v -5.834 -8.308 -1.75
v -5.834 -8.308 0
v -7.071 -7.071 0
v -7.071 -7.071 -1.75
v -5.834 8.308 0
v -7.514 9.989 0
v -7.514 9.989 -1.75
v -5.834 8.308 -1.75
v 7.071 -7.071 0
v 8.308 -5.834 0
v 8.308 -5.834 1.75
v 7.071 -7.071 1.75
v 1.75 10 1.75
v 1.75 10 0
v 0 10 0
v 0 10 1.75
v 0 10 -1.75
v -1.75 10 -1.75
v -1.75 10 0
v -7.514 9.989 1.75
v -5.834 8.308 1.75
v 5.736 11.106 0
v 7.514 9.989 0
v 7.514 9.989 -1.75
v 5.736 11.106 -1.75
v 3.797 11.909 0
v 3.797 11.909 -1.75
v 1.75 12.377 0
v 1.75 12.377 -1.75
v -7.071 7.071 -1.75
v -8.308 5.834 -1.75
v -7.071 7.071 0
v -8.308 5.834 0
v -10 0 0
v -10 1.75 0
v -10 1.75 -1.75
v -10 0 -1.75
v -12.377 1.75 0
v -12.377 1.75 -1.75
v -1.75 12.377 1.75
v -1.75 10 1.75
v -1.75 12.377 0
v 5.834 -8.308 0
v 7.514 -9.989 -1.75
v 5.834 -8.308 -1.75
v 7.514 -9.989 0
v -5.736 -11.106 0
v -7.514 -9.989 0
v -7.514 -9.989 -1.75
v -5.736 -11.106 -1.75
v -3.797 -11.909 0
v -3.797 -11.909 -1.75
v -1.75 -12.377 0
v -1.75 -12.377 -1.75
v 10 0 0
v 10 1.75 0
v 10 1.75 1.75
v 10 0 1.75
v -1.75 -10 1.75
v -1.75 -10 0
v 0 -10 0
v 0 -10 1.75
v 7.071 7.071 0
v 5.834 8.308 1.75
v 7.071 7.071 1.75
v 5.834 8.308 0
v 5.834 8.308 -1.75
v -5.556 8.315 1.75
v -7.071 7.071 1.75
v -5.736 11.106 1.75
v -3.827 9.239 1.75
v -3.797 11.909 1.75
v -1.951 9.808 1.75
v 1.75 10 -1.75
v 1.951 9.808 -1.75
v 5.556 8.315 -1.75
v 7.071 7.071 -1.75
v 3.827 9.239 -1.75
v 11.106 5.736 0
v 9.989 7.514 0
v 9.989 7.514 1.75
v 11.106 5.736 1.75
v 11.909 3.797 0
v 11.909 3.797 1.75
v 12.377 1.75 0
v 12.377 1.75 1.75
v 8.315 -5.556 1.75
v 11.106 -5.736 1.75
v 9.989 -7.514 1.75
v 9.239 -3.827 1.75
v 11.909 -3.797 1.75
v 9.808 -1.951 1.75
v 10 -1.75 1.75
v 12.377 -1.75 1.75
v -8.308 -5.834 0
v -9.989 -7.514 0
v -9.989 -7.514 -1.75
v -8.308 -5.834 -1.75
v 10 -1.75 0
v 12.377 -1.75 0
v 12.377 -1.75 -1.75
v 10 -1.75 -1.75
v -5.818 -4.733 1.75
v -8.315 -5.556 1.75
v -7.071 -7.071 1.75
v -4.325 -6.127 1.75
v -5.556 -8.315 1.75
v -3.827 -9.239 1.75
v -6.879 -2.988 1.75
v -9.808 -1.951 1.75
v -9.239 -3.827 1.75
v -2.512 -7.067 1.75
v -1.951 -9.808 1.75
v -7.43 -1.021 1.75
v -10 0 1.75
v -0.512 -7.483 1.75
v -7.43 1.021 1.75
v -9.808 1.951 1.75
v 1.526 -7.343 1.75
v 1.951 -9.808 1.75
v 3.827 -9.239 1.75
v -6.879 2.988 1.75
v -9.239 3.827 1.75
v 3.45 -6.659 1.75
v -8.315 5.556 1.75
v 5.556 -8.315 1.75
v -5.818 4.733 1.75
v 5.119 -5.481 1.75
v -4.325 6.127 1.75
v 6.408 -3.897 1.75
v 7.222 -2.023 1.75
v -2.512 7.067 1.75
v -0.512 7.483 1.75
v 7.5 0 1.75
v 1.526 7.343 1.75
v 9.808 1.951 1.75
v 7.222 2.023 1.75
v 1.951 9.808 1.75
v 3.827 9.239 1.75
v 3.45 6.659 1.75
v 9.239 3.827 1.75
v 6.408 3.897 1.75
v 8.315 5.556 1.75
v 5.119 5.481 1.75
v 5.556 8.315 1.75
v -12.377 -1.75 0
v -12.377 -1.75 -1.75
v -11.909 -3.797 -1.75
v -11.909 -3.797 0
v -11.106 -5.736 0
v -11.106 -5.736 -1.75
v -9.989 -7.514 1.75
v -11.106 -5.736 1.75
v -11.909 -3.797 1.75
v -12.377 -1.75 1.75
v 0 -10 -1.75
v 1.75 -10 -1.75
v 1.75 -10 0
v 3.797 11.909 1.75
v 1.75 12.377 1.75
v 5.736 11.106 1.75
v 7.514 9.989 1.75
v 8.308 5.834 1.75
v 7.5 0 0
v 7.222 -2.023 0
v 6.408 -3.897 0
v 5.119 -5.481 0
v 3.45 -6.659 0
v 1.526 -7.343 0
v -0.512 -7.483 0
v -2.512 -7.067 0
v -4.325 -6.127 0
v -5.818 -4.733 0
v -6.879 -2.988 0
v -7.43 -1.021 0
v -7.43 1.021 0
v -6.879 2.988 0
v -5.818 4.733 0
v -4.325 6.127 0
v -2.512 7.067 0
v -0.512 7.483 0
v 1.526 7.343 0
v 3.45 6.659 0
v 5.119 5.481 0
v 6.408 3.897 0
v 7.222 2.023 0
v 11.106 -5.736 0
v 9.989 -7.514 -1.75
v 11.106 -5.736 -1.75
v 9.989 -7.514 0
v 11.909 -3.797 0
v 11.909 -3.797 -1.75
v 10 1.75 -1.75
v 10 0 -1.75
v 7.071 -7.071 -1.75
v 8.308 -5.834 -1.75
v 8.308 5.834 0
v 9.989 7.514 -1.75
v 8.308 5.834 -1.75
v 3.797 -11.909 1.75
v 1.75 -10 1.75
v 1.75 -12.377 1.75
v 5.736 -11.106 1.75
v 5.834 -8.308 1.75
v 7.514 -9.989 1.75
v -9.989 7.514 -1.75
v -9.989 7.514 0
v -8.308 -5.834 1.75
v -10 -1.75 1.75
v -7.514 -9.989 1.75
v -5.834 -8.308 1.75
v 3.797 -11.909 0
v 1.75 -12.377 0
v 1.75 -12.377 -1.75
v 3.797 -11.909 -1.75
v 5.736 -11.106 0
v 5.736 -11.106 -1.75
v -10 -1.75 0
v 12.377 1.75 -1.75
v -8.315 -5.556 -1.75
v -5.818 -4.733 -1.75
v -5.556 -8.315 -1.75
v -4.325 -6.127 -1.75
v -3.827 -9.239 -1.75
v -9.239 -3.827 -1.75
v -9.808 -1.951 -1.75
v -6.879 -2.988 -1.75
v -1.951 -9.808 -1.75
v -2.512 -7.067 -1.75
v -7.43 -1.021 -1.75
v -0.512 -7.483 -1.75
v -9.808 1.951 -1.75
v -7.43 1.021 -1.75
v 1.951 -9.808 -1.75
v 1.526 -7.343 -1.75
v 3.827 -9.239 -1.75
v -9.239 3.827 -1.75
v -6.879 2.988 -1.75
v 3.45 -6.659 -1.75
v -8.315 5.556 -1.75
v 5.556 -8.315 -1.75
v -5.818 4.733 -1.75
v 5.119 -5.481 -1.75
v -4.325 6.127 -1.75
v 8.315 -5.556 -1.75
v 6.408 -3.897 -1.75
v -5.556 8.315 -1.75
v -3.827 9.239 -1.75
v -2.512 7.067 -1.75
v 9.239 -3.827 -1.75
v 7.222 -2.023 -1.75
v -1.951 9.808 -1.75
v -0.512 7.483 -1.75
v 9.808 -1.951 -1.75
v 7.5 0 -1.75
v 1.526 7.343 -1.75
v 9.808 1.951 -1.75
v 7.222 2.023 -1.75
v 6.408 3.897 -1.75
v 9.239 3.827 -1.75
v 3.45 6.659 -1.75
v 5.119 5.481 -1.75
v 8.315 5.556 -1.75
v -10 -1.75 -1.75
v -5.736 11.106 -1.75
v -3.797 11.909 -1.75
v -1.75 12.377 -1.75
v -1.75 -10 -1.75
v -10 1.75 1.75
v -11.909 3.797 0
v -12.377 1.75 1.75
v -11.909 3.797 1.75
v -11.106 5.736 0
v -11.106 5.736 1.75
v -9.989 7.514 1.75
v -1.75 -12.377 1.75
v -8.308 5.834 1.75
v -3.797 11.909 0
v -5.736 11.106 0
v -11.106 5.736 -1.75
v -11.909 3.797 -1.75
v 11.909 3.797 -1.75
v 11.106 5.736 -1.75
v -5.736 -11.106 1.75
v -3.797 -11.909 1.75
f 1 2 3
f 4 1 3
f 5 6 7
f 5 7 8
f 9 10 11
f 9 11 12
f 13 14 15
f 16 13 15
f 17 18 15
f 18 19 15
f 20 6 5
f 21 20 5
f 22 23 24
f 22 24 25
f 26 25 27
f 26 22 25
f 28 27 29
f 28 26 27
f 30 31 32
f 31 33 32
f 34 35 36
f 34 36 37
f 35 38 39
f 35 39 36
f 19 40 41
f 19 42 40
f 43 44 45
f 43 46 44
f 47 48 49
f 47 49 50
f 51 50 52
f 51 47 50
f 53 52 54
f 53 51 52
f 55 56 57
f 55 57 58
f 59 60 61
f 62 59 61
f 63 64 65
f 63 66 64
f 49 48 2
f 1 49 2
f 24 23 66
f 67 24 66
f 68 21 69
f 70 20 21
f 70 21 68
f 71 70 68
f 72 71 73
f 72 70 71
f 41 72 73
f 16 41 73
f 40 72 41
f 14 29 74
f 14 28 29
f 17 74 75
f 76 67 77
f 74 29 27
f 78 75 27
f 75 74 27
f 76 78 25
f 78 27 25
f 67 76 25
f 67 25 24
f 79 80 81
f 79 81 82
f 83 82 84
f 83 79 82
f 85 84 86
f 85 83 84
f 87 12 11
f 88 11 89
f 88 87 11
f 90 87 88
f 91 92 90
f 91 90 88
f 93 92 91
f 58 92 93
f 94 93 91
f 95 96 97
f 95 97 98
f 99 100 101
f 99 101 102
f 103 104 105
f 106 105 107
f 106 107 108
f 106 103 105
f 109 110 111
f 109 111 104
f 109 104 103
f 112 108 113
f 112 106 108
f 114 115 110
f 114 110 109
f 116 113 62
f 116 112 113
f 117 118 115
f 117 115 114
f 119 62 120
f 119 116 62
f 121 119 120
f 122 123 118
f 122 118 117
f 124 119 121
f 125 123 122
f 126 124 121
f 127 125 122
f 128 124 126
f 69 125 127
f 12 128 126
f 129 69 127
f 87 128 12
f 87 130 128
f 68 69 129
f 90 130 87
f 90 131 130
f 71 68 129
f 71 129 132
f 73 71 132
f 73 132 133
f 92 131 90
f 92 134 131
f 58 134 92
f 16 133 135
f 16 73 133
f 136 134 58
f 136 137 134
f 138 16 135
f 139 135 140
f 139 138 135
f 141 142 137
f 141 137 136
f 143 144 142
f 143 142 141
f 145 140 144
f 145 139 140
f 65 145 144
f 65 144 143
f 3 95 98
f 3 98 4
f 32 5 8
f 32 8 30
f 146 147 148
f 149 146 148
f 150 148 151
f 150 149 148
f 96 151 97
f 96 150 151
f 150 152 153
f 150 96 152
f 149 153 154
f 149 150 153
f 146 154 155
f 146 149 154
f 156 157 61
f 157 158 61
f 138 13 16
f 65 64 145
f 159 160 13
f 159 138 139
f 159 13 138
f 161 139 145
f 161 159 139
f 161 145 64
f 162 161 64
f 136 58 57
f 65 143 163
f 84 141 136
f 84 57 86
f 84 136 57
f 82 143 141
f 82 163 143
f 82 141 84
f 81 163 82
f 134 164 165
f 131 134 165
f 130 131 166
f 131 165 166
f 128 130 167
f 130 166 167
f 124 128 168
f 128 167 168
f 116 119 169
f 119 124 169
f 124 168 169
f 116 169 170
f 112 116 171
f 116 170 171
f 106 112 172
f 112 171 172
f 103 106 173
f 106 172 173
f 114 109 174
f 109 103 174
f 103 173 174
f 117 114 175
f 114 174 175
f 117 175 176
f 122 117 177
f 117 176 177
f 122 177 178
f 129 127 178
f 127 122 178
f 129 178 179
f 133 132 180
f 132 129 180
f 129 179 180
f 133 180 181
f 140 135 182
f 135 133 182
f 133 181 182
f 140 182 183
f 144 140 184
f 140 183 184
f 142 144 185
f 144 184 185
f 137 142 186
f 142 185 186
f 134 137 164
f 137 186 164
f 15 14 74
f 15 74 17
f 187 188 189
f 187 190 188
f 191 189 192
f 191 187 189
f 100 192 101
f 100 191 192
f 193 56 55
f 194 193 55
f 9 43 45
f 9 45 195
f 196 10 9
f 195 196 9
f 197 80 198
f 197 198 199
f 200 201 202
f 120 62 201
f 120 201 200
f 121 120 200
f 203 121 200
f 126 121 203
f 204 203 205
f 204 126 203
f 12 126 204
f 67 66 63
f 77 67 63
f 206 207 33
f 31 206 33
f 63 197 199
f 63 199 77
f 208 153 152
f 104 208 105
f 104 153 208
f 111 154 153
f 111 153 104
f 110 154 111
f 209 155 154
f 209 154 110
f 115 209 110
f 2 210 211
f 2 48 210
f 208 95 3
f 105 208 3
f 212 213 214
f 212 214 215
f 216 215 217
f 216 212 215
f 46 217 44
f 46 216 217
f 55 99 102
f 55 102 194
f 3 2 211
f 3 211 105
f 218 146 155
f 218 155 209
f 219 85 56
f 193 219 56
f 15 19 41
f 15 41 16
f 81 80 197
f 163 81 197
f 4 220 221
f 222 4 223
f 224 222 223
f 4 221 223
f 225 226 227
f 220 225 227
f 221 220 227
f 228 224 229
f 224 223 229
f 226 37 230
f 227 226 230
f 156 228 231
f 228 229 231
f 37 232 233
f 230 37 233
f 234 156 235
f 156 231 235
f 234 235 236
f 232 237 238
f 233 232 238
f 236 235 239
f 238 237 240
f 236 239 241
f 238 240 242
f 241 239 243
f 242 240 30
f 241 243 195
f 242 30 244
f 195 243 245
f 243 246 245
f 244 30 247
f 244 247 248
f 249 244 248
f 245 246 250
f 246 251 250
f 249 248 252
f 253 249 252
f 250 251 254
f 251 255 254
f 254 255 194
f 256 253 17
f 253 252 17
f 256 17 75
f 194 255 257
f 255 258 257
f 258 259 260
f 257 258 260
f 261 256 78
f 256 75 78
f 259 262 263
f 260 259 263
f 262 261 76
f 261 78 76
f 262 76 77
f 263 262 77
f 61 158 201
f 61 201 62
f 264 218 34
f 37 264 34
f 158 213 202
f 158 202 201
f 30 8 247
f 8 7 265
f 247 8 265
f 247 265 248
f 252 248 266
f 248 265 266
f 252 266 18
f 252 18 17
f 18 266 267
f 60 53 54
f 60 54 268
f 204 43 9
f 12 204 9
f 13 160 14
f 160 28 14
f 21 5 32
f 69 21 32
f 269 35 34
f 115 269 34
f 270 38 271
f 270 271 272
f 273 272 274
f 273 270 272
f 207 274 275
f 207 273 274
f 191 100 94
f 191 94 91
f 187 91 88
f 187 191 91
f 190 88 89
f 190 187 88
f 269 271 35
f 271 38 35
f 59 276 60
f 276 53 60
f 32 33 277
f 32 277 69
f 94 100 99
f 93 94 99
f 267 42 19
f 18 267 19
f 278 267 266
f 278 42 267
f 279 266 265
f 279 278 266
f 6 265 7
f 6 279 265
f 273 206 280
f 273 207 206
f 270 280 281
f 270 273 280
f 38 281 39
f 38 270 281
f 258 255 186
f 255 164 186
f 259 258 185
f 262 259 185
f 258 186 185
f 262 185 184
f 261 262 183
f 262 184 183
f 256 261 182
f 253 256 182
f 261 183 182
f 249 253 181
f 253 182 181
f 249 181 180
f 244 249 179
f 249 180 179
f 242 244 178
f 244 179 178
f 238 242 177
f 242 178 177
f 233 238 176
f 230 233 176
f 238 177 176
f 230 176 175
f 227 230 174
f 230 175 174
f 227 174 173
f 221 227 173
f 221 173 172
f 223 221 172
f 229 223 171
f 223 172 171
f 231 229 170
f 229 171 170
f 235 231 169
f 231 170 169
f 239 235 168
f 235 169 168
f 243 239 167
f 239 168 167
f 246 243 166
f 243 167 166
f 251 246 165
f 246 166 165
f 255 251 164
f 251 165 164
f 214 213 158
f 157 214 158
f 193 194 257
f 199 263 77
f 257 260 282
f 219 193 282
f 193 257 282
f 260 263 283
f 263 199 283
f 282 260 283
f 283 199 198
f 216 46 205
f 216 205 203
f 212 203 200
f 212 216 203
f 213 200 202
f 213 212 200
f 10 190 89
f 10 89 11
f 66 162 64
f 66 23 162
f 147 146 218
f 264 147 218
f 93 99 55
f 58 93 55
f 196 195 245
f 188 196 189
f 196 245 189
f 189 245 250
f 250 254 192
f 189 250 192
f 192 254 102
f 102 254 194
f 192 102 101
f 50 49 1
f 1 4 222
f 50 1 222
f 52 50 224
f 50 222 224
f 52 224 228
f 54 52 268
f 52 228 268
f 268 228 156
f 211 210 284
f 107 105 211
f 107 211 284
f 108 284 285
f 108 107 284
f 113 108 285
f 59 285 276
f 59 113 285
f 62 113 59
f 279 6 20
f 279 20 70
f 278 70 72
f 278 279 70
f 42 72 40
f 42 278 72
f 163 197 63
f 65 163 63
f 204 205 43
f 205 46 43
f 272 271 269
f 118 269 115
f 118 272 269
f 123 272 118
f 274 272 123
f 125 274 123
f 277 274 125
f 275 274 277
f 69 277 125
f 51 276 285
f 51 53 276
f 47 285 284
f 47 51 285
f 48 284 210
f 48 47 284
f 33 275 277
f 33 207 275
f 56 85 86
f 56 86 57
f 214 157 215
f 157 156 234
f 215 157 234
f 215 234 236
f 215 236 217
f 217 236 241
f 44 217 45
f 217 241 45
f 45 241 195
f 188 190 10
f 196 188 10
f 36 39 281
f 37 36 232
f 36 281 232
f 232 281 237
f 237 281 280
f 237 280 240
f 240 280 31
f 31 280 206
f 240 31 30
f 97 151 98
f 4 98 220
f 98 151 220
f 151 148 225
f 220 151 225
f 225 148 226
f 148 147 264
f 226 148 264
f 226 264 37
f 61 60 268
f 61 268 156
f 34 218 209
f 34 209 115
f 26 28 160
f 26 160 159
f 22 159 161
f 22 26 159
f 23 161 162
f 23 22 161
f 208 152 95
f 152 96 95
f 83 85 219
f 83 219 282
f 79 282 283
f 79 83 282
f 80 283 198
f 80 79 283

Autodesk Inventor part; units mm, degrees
ref_plane "YZ Plane" through (0, 0, 0) normal (1, 0, 0) x (0, 1, 0)
ref_plane "XZ Plane" through (0, 0, 0) normal (0, 1, 0) x (-1, 0, 0)
ref_plane "XY Plane" through (0, 0, 0) normal (0, 0, 1) x (1, 0, 0)
sketch "Sketch1" plane through (0, 0, 0) normal (0, 0, 1) x (1, 0, 0)
  circle A0 centre (0, 0) radius 10
  circle A1 centre (0, 0) radius 12.5
  circle A2 centre (0, 0) radius 7.5
  line L0 (10, 0) -> (12.5, 0)
  line L1 (12.5, 0) -> (12.5, 1.75)
  line L2 (12.5, 1.75) -> (10, 1.75)
  line L3 (10, 1.75) -> (10, 0)
  line L4 (12.5, 0) -> (12.5, -1.75)
  line L5 (12.5, -1.75) -> (10, -1.75)
  line L6 (10, -1.75) -> (10, 0)
  line L7 (10.0763, 7.6014) -> (8.3085, 5.8336)
  line L8 (8.3085, 5.8336) -> (7.0711, 7.0711)
  line L9 (5.8336, 8.3085) -> (7.0711, 7.0711)
  line L10 (7.6014, 10.0763) -> (5.8336, 8.3085)
  line L11 (8.8388, 8.8388) -> (7.6014, 10.0763)
  line L12 (8.8388, 8.8388) -> (10.0763, 7.6014)
  line L13 (1.75, 12.5) -> (1.75, 10)
  line L14 (1.75, 10) -> (0, 10)
  line L15 (-1.75, 10) -> (0, 10)
  line L16 (-1.75, 12.5) -> (-1.75, 10)
  line L17 (0, 12.5) -> (-1.75, 12.5)
  line L18 (0, 12.5) -> (1.75, 12.5)
  line L19 (-7.6014, 10.0763) -> (-5.8336, 8.3085)
  line L20 (-5.8336, 8.3085) -> (-7.0711, 7.0711)
  line L21 (-8.3085, 5.8336) -> (-7.0711, 7.0711)
  line L22 (-10.0763, 7.6014) -> (-8.3085, 5.8336)
  line L23 (-8.8388, 8.8388) -> (-10.0763, 7.6014)
  line L24 (-8.8388, 8.8388) -> (-7.6014, 10.0763)
  line L25 (-12.5, 1.75) -> (-10, 1.75)
  line L26 (-10, 1.75) -> (-10, 0)
  line L27 (-10, -1.75) -> (-10, 0)
  line L28 (-12.5, -1.75) -> (-10, -1.75)
  line L29 (-12.5, 0) -> (-12.5, -1.75)
  line L30 (-12.5, 0) -> (-12.5, 1.75)
  line L31 (-10.0763, -7.6014) -> (-8.3085, -5.8336)
  line L32 (-8.3085, -5.8336) -> (-7.0711, -7.0711)
  line L33 (-5.8336, -8.3085) -> (-7.0711, -7.0711)
  line L34 (-7.6014, -10.0763) -> (-5.8336, -8.3085)
  line L35 (-8.8388, -8.8388) -> (-7.6014, -10.0763)
  line L36 (-8.8388, -8.8388) -> (-10.0763, -7.6014)
  line L37 (-1.75, -12.5) -> (-1.75, -10)
  line L38 (-1.75, -10) -> (0, -10)
  line L39 (1.75, -10) -> (0, -10)
  line L40 (1.75, -12.5) -> (1.75, -10)
  line L41 (0, -12.5) -> (1.75, -12.5)
  line L42 (0, -12.5) -> (-1.75, -12.5)
  line L43 (7.6014, -10.0763) -> (5.8336, -8.3085)
  line L44 (5.8336, -8.3085) -> (7.0711, -7.0711)
  line L45 (8.3085, -5.8336) -> (7.0711, -7.0711)
  line L46 (10.0763, -7.6014) -> (8.3085, -5.8336)
  line L47 (8.8388, -8.8388) -> (10.0763, -7.6014)
  line L48 (8.8388, -8.8388) -> (7.6014, -10.0763)
  point P0 (-1.75, 12.3769)
  point P1 (-7.5143, 9.9892)
  point P2 (-9.9892, 7.5143)
  point P3 (-12.3769, 1.75)
  point P4 (-12.3769, -1.75)
  point P5 (-9.9892, -7.5143)
  point P6 (-7.5143, -9.9892)
  point P7 (-1.75, -12.3769)
  point P8 (1.75, -12.3769)
  point P9 (7.5143, -9.9892)
  point P10 (9.9892, -7.5143)
  point P11 (12.3769, -1.75)
  point P12 (12.3769, 1.75)
  point P13 (9.9892, 7.5143)
  point P14 (7.5143, 9.9892)
  point P15 (1.75, 12.3769)
  dimension "d10" = 20
  dimension "d11" = 2.5
  dimension "d12" = 2.5
  dimension "d13" = 1.75
  dimension "d16" = 360
extrude "Extrusion1" add sketch "Sketch1" along normal mid plane 3.5 contours A0 | L6 L5 A1 L46 L45 A0 | A0 L8 L7 A1 L2 L3 | A0 L14 L13 A1 L10 L9 | L44 L43 A1 L40 L39 A0 | A0 L20 L19 A1 L16 L15 | L38 L37 A1 L34 L33 A0 | A0 L26 L25 A1 L22 L21 | L32 L31 A1 L28 L27 A0
properties part number "Vrhnji obrok"
